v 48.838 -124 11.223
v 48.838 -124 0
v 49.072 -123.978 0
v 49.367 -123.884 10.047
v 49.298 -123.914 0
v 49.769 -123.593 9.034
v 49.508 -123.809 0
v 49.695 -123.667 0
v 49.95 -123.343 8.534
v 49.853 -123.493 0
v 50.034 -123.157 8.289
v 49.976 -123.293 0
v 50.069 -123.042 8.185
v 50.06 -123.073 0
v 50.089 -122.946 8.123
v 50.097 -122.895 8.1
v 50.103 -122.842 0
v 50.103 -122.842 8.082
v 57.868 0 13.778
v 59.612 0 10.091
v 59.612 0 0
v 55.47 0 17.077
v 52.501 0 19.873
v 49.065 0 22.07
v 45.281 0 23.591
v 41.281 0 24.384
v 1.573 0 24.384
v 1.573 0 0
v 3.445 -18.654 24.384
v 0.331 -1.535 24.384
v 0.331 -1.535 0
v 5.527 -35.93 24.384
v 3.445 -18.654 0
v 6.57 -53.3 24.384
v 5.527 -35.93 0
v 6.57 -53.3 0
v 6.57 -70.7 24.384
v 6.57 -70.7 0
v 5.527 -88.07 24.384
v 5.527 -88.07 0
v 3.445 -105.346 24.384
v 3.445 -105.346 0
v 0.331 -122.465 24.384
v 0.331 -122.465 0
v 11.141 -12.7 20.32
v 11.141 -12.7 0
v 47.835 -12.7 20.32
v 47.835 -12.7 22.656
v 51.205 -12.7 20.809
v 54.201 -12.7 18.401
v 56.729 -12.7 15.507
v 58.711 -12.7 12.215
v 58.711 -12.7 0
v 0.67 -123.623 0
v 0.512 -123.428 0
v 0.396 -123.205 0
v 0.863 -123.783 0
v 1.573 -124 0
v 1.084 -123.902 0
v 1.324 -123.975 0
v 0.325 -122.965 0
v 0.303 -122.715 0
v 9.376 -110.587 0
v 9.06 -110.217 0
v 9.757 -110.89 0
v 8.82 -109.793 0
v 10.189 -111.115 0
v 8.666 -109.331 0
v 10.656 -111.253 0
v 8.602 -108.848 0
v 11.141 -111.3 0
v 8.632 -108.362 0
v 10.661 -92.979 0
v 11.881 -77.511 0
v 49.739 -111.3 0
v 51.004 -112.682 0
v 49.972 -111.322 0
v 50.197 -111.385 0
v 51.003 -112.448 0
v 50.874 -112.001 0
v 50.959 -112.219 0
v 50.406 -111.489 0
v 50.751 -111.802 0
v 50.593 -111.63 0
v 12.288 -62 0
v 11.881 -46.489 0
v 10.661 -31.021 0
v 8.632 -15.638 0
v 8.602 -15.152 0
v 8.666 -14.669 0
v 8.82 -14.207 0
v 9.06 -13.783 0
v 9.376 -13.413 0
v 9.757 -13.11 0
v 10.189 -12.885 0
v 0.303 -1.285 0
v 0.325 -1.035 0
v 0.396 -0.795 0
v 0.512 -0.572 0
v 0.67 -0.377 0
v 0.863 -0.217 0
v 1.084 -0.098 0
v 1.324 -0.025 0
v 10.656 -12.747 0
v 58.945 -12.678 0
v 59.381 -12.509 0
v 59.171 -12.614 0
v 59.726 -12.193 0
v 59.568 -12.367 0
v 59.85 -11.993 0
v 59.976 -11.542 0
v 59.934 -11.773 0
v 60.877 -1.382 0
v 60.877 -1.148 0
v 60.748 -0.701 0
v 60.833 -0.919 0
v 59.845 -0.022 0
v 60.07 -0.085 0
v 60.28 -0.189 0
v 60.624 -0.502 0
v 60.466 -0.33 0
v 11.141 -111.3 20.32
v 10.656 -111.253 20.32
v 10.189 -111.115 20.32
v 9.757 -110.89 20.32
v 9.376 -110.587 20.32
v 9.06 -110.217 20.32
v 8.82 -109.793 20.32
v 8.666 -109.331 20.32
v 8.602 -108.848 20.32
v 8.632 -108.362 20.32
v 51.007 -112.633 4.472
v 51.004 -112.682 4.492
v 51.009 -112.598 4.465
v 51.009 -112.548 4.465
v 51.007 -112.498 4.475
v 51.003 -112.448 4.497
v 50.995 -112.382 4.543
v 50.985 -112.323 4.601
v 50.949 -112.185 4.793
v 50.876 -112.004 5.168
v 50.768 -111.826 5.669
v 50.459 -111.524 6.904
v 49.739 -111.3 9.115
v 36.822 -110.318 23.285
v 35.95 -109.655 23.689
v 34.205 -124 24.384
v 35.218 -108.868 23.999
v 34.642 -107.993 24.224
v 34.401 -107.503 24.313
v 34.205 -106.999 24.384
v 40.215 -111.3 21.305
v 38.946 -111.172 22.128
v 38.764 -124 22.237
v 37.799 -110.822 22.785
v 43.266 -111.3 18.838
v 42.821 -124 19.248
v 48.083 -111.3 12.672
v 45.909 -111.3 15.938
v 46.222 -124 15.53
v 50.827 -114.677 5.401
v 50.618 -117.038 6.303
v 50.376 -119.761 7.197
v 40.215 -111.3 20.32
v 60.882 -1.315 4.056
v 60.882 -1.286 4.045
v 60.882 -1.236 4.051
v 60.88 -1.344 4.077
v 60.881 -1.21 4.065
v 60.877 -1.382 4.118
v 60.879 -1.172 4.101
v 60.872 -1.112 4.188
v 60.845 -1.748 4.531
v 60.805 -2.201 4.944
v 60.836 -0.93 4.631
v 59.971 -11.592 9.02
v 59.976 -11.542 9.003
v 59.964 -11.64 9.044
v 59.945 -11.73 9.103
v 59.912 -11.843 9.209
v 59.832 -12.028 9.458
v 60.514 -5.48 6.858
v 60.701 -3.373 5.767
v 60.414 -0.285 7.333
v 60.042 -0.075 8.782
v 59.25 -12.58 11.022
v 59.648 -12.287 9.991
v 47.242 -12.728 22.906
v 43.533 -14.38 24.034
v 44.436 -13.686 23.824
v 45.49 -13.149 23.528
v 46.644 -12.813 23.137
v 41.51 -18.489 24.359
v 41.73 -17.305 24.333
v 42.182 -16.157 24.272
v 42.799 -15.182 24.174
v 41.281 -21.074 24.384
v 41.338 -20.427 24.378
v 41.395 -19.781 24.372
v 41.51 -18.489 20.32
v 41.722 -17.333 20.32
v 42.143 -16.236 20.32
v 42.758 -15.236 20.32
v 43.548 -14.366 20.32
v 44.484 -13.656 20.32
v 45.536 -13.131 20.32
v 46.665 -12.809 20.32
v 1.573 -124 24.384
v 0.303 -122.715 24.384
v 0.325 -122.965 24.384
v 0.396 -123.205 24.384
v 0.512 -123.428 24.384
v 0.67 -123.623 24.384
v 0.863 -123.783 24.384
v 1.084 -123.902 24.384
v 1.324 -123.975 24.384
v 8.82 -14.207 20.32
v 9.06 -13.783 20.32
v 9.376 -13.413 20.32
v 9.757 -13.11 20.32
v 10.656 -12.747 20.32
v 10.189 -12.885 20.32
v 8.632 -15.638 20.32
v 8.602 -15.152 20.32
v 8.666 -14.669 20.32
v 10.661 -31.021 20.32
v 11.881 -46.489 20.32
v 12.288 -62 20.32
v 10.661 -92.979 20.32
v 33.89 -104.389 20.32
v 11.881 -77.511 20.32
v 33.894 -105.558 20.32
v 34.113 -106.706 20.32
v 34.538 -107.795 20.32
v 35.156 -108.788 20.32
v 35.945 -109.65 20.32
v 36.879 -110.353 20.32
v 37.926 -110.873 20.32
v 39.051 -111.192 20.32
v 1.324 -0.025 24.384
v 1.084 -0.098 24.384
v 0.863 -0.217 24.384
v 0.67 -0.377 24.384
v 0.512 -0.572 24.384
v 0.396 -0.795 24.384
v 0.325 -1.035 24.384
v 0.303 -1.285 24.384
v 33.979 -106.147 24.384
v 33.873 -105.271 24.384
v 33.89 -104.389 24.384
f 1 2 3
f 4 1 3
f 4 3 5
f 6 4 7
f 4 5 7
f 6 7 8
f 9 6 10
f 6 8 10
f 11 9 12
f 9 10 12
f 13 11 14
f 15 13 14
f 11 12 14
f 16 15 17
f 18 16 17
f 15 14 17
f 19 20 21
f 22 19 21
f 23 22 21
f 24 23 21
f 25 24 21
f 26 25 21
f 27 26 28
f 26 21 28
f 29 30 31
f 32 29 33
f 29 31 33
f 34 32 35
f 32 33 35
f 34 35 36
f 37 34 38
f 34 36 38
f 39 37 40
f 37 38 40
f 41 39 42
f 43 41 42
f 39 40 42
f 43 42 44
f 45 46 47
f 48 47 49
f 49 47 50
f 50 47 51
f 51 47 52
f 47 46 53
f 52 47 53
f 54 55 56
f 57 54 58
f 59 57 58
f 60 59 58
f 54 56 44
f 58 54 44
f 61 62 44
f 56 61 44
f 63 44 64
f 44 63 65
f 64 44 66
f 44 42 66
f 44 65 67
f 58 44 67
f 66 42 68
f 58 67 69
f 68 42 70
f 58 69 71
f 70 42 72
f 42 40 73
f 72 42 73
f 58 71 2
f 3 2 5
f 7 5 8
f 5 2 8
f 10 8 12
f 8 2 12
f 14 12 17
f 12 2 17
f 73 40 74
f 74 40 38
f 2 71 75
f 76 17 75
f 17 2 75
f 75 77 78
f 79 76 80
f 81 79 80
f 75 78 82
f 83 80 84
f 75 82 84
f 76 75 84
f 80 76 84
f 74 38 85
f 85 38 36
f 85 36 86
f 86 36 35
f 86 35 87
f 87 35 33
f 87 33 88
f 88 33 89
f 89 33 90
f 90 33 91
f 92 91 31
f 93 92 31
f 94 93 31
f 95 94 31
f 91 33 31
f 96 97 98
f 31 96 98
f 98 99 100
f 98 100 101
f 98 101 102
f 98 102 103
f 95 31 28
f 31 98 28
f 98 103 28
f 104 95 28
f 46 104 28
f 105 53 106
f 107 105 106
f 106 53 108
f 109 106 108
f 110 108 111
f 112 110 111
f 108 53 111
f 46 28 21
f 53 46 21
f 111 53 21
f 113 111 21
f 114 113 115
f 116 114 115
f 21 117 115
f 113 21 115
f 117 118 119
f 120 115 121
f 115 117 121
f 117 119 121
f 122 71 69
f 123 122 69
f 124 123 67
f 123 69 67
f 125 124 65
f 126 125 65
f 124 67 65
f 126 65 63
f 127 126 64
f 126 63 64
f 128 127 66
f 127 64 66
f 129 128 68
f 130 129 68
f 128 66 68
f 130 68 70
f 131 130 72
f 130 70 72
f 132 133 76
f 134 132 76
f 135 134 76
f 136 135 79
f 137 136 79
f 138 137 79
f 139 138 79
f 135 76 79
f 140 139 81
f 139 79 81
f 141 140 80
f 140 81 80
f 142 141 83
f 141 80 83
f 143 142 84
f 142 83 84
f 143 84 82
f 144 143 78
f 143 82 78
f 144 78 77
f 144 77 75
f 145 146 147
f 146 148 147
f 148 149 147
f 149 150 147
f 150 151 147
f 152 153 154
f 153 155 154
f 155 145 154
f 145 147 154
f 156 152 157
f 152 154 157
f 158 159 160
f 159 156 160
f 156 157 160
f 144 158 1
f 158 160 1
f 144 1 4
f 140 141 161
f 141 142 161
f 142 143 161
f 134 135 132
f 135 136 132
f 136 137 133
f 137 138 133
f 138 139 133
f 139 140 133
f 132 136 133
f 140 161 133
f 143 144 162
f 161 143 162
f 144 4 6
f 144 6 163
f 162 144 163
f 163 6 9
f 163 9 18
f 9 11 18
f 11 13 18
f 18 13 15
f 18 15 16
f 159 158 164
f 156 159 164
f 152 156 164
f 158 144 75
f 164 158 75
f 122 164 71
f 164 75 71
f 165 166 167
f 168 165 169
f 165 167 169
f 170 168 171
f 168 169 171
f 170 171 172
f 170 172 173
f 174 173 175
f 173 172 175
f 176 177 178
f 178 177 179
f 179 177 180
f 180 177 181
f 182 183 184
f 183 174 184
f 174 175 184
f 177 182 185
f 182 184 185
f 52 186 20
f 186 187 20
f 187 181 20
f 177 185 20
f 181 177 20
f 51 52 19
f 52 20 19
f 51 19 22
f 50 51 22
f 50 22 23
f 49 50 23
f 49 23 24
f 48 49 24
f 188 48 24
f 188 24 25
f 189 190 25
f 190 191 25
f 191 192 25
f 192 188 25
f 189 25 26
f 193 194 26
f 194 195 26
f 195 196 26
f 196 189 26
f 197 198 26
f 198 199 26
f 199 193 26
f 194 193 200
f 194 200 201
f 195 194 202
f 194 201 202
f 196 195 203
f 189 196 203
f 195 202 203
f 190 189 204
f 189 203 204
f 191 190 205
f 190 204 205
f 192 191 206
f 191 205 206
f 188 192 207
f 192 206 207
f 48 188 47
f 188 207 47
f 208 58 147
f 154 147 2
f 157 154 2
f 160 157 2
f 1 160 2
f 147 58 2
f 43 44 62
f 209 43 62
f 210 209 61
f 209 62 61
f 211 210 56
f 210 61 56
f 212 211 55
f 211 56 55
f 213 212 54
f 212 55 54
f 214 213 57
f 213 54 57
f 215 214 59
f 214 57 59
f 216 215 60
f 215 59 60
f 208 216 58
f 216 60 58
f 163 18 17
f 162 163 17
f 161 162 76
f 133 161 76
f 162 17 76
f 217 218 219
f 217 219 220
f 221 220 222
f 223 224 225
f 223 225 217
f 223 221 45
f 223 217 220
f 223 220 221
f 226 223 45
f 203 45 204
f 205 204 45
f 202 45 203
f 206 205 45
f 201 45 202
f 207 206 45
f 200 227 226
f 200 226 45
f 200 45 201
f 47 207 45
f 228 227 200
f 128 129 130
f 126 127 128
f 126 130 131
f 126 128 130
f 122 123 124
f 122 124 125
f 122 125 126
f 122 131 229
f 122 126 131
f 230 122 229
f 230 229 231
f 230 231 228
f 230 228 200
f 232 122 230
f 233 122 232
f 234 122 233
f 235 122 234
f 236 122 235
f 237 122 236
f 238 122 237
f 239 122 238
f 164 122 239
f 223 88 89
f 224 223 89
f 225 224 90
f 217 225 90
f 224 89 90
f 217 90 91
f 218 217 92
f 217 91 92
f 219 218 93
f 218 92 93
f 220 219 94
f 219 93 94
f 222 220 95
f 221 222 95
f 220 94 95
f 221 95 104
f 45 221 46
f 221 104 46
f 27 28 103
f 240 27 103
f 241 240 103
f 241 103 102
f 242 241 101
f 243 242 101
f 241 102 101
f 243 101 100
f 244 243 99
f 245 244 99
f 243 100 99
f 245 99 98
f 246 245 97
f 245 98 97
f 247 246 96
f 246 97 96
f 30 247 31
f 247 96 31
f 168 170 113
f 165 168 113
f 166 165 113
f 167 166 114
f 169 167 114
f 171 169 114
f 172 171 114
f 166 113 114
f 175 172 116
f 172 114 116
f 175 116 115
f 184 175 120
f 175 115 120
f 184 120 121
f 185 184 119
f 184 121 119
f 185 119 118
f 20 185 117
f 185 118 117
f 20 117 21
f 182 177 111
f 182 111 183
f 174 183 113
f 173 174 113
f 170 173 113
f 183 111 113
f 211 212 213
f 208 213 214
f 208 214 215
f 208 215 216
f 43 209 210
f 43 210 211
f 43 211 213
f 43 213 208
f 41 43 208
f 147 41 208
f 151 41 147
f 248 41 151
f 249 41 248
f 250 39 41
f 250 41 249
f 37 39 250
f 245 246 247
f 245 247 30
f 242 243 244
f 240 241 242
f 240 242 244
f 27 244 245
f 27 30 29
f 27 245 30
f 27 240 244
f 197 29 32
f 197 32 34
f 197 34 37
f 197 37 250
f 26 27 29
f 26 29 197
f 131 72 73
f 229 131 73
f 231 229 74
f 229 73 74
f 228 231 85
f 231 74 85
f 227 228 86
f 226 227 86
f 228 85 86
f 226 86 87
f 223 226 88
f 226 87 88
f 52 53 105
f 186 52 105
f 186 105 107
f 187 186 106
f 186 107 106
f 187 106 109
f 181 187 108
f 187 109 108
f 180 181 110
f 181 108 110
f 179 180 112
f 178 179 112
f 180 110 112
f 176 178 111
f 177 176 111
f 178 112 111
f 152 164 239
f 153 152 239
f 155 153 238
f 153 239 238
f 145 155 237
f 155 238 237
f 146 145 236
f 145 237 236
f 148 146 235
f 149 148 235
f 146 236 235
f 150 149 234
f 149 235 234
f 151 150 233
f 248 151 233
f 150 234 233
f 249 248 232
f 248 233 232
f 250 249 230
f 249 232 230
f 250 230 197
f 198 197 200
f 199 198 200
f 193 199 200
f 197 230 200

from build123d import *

# Parameters (mm, degrees)
F1_DEPTH = 24.384
F3_DEPTH = 20.32
F6_DEPTH = 124.001
F7_DEPTH = 19.5072


with BuildPart() as f1:
    # F0 (on Top) → F1 (new body)
    with BuildSketch(Plane.XY):
        with BuildLine():
            Line((59.612351, 0), (1.573374, 0))
            ThreePointArc((1.573374, 0), (0.586221, -0.470982), (0.331244, -1.5346))
            ThreePointArc((0.331244, -1.5346), (6.7, -62), (0.331244, -122.4654))
            ThreePointArc((0.331244, -122.4654), (0.586221, -123.529018), (1.573374, -124))
            Line((1.573374, -124), (48.837674, -124))
            ThreePointArc((48.837674, -124), (49.695106, -123.666862), (50.102706, -122.842221))
            Line((50.102706, -122.842221), (51.003997, -112.682221))
            ThreePointArc((51.003997, -112.682221), (50.675826, -111.712568), (49.738964, -111.3))
            Line((49.738964, -111.3), (40.215034, -111.3))
            ThreePointArc((40.215034, -111.3), (35.530725, -109.237161), (33.889873, -104.388897))
            Line((33.889873, -104.388897), (41.510034, -18.488897))
            ThreePointArc((41.510034, -18.488897), (43.548034, -14.365691), (47.835195, -12.7))
            Line((47.835195, -12.7), (58.711061, -12.7))
            ThreePointArc((58.711061, -12.7), (59.568493, -12.366862), (59.976093, -11.542221))
            Line((59.976093, -11.542221), (60.877384, -1.382221))
            ThreePointArc((60.877384, -1.382221), (60.549213, -0.412568), (59.612351, 0))
        make_face()
    extrude(amount=F1_DEPTH)

    # F2 (on face) → F3 (cut)
    with BuildSketch(Plane(origin=(0, 0, 0), x_dir=(1, 0, 0), z_dir=(0, 0, -1))):
        with BuildLine():
            ThreePointArc((11.140821, 111.3), (9.209142, 110.409307), (8.632213, 108.361901))
            ThreePointArc((8.632213, 108.361901), (12.288, 62), (8.632213, 15.638099))
            ThreePointArc((8.632213, 15.638099), (9.209142, 13.590693), (11.140821, 12.7))
            Line((11.140821, 12.7), (59.612351, 12.7))
            Line((59.612351, 12.7), (48.837674, 111.3))
            Line((48.837674, 111.3), (11.140821, 111.3))
        make_face()
    extrude(amount=-F3_DEPTH, mode=Mode.SUBTRACT)

    # F4 (on face) → F6 (cut, through all)
    with BuildSketch(Plane(origin=(0, 0, 0), x_dir=(-1, 0, 0), z_dir=(0, 1, 0))):
        with BuildLine():
            Line((-60.905915, 0), (-60.905915, 1.609697))
            ThreePointArc((-60.905915, 1.609697), (-55.623214, 16.900361), (-41.280743, 24.384))
            Line((-41.280743, 24.384), (-40.572539, 44.529654))
            Line((-40.572539, 44.529654), (-74.00889, 45.705081))
            Line((-74.00889, 45.705081), (-79.637952, 1.058017))
            Line((-79.637952, 1.058017), (-60.905915, 0))
        make_face()
    extrude(amount=-F6_DEPTH, mode=Mode.SUBTRACT)

    # F5 (on face) → F7 (cut)
    with BuildSketch(Plane.XZ.offset(124)):
        with BuildLine():
            ThreePointArc((34.204833, 24.384), (46.666601, 14.917599), (51.396679, 0))
            Line((51.396679, 0), (51.396679, 24.384))
            Line((51.396679, 24.384), (34.204833, 24.384))
        make_face()
    extrude(amount=-F7_DEPTH, mode=Mode.SUBTRACT)


solid = f1.part
